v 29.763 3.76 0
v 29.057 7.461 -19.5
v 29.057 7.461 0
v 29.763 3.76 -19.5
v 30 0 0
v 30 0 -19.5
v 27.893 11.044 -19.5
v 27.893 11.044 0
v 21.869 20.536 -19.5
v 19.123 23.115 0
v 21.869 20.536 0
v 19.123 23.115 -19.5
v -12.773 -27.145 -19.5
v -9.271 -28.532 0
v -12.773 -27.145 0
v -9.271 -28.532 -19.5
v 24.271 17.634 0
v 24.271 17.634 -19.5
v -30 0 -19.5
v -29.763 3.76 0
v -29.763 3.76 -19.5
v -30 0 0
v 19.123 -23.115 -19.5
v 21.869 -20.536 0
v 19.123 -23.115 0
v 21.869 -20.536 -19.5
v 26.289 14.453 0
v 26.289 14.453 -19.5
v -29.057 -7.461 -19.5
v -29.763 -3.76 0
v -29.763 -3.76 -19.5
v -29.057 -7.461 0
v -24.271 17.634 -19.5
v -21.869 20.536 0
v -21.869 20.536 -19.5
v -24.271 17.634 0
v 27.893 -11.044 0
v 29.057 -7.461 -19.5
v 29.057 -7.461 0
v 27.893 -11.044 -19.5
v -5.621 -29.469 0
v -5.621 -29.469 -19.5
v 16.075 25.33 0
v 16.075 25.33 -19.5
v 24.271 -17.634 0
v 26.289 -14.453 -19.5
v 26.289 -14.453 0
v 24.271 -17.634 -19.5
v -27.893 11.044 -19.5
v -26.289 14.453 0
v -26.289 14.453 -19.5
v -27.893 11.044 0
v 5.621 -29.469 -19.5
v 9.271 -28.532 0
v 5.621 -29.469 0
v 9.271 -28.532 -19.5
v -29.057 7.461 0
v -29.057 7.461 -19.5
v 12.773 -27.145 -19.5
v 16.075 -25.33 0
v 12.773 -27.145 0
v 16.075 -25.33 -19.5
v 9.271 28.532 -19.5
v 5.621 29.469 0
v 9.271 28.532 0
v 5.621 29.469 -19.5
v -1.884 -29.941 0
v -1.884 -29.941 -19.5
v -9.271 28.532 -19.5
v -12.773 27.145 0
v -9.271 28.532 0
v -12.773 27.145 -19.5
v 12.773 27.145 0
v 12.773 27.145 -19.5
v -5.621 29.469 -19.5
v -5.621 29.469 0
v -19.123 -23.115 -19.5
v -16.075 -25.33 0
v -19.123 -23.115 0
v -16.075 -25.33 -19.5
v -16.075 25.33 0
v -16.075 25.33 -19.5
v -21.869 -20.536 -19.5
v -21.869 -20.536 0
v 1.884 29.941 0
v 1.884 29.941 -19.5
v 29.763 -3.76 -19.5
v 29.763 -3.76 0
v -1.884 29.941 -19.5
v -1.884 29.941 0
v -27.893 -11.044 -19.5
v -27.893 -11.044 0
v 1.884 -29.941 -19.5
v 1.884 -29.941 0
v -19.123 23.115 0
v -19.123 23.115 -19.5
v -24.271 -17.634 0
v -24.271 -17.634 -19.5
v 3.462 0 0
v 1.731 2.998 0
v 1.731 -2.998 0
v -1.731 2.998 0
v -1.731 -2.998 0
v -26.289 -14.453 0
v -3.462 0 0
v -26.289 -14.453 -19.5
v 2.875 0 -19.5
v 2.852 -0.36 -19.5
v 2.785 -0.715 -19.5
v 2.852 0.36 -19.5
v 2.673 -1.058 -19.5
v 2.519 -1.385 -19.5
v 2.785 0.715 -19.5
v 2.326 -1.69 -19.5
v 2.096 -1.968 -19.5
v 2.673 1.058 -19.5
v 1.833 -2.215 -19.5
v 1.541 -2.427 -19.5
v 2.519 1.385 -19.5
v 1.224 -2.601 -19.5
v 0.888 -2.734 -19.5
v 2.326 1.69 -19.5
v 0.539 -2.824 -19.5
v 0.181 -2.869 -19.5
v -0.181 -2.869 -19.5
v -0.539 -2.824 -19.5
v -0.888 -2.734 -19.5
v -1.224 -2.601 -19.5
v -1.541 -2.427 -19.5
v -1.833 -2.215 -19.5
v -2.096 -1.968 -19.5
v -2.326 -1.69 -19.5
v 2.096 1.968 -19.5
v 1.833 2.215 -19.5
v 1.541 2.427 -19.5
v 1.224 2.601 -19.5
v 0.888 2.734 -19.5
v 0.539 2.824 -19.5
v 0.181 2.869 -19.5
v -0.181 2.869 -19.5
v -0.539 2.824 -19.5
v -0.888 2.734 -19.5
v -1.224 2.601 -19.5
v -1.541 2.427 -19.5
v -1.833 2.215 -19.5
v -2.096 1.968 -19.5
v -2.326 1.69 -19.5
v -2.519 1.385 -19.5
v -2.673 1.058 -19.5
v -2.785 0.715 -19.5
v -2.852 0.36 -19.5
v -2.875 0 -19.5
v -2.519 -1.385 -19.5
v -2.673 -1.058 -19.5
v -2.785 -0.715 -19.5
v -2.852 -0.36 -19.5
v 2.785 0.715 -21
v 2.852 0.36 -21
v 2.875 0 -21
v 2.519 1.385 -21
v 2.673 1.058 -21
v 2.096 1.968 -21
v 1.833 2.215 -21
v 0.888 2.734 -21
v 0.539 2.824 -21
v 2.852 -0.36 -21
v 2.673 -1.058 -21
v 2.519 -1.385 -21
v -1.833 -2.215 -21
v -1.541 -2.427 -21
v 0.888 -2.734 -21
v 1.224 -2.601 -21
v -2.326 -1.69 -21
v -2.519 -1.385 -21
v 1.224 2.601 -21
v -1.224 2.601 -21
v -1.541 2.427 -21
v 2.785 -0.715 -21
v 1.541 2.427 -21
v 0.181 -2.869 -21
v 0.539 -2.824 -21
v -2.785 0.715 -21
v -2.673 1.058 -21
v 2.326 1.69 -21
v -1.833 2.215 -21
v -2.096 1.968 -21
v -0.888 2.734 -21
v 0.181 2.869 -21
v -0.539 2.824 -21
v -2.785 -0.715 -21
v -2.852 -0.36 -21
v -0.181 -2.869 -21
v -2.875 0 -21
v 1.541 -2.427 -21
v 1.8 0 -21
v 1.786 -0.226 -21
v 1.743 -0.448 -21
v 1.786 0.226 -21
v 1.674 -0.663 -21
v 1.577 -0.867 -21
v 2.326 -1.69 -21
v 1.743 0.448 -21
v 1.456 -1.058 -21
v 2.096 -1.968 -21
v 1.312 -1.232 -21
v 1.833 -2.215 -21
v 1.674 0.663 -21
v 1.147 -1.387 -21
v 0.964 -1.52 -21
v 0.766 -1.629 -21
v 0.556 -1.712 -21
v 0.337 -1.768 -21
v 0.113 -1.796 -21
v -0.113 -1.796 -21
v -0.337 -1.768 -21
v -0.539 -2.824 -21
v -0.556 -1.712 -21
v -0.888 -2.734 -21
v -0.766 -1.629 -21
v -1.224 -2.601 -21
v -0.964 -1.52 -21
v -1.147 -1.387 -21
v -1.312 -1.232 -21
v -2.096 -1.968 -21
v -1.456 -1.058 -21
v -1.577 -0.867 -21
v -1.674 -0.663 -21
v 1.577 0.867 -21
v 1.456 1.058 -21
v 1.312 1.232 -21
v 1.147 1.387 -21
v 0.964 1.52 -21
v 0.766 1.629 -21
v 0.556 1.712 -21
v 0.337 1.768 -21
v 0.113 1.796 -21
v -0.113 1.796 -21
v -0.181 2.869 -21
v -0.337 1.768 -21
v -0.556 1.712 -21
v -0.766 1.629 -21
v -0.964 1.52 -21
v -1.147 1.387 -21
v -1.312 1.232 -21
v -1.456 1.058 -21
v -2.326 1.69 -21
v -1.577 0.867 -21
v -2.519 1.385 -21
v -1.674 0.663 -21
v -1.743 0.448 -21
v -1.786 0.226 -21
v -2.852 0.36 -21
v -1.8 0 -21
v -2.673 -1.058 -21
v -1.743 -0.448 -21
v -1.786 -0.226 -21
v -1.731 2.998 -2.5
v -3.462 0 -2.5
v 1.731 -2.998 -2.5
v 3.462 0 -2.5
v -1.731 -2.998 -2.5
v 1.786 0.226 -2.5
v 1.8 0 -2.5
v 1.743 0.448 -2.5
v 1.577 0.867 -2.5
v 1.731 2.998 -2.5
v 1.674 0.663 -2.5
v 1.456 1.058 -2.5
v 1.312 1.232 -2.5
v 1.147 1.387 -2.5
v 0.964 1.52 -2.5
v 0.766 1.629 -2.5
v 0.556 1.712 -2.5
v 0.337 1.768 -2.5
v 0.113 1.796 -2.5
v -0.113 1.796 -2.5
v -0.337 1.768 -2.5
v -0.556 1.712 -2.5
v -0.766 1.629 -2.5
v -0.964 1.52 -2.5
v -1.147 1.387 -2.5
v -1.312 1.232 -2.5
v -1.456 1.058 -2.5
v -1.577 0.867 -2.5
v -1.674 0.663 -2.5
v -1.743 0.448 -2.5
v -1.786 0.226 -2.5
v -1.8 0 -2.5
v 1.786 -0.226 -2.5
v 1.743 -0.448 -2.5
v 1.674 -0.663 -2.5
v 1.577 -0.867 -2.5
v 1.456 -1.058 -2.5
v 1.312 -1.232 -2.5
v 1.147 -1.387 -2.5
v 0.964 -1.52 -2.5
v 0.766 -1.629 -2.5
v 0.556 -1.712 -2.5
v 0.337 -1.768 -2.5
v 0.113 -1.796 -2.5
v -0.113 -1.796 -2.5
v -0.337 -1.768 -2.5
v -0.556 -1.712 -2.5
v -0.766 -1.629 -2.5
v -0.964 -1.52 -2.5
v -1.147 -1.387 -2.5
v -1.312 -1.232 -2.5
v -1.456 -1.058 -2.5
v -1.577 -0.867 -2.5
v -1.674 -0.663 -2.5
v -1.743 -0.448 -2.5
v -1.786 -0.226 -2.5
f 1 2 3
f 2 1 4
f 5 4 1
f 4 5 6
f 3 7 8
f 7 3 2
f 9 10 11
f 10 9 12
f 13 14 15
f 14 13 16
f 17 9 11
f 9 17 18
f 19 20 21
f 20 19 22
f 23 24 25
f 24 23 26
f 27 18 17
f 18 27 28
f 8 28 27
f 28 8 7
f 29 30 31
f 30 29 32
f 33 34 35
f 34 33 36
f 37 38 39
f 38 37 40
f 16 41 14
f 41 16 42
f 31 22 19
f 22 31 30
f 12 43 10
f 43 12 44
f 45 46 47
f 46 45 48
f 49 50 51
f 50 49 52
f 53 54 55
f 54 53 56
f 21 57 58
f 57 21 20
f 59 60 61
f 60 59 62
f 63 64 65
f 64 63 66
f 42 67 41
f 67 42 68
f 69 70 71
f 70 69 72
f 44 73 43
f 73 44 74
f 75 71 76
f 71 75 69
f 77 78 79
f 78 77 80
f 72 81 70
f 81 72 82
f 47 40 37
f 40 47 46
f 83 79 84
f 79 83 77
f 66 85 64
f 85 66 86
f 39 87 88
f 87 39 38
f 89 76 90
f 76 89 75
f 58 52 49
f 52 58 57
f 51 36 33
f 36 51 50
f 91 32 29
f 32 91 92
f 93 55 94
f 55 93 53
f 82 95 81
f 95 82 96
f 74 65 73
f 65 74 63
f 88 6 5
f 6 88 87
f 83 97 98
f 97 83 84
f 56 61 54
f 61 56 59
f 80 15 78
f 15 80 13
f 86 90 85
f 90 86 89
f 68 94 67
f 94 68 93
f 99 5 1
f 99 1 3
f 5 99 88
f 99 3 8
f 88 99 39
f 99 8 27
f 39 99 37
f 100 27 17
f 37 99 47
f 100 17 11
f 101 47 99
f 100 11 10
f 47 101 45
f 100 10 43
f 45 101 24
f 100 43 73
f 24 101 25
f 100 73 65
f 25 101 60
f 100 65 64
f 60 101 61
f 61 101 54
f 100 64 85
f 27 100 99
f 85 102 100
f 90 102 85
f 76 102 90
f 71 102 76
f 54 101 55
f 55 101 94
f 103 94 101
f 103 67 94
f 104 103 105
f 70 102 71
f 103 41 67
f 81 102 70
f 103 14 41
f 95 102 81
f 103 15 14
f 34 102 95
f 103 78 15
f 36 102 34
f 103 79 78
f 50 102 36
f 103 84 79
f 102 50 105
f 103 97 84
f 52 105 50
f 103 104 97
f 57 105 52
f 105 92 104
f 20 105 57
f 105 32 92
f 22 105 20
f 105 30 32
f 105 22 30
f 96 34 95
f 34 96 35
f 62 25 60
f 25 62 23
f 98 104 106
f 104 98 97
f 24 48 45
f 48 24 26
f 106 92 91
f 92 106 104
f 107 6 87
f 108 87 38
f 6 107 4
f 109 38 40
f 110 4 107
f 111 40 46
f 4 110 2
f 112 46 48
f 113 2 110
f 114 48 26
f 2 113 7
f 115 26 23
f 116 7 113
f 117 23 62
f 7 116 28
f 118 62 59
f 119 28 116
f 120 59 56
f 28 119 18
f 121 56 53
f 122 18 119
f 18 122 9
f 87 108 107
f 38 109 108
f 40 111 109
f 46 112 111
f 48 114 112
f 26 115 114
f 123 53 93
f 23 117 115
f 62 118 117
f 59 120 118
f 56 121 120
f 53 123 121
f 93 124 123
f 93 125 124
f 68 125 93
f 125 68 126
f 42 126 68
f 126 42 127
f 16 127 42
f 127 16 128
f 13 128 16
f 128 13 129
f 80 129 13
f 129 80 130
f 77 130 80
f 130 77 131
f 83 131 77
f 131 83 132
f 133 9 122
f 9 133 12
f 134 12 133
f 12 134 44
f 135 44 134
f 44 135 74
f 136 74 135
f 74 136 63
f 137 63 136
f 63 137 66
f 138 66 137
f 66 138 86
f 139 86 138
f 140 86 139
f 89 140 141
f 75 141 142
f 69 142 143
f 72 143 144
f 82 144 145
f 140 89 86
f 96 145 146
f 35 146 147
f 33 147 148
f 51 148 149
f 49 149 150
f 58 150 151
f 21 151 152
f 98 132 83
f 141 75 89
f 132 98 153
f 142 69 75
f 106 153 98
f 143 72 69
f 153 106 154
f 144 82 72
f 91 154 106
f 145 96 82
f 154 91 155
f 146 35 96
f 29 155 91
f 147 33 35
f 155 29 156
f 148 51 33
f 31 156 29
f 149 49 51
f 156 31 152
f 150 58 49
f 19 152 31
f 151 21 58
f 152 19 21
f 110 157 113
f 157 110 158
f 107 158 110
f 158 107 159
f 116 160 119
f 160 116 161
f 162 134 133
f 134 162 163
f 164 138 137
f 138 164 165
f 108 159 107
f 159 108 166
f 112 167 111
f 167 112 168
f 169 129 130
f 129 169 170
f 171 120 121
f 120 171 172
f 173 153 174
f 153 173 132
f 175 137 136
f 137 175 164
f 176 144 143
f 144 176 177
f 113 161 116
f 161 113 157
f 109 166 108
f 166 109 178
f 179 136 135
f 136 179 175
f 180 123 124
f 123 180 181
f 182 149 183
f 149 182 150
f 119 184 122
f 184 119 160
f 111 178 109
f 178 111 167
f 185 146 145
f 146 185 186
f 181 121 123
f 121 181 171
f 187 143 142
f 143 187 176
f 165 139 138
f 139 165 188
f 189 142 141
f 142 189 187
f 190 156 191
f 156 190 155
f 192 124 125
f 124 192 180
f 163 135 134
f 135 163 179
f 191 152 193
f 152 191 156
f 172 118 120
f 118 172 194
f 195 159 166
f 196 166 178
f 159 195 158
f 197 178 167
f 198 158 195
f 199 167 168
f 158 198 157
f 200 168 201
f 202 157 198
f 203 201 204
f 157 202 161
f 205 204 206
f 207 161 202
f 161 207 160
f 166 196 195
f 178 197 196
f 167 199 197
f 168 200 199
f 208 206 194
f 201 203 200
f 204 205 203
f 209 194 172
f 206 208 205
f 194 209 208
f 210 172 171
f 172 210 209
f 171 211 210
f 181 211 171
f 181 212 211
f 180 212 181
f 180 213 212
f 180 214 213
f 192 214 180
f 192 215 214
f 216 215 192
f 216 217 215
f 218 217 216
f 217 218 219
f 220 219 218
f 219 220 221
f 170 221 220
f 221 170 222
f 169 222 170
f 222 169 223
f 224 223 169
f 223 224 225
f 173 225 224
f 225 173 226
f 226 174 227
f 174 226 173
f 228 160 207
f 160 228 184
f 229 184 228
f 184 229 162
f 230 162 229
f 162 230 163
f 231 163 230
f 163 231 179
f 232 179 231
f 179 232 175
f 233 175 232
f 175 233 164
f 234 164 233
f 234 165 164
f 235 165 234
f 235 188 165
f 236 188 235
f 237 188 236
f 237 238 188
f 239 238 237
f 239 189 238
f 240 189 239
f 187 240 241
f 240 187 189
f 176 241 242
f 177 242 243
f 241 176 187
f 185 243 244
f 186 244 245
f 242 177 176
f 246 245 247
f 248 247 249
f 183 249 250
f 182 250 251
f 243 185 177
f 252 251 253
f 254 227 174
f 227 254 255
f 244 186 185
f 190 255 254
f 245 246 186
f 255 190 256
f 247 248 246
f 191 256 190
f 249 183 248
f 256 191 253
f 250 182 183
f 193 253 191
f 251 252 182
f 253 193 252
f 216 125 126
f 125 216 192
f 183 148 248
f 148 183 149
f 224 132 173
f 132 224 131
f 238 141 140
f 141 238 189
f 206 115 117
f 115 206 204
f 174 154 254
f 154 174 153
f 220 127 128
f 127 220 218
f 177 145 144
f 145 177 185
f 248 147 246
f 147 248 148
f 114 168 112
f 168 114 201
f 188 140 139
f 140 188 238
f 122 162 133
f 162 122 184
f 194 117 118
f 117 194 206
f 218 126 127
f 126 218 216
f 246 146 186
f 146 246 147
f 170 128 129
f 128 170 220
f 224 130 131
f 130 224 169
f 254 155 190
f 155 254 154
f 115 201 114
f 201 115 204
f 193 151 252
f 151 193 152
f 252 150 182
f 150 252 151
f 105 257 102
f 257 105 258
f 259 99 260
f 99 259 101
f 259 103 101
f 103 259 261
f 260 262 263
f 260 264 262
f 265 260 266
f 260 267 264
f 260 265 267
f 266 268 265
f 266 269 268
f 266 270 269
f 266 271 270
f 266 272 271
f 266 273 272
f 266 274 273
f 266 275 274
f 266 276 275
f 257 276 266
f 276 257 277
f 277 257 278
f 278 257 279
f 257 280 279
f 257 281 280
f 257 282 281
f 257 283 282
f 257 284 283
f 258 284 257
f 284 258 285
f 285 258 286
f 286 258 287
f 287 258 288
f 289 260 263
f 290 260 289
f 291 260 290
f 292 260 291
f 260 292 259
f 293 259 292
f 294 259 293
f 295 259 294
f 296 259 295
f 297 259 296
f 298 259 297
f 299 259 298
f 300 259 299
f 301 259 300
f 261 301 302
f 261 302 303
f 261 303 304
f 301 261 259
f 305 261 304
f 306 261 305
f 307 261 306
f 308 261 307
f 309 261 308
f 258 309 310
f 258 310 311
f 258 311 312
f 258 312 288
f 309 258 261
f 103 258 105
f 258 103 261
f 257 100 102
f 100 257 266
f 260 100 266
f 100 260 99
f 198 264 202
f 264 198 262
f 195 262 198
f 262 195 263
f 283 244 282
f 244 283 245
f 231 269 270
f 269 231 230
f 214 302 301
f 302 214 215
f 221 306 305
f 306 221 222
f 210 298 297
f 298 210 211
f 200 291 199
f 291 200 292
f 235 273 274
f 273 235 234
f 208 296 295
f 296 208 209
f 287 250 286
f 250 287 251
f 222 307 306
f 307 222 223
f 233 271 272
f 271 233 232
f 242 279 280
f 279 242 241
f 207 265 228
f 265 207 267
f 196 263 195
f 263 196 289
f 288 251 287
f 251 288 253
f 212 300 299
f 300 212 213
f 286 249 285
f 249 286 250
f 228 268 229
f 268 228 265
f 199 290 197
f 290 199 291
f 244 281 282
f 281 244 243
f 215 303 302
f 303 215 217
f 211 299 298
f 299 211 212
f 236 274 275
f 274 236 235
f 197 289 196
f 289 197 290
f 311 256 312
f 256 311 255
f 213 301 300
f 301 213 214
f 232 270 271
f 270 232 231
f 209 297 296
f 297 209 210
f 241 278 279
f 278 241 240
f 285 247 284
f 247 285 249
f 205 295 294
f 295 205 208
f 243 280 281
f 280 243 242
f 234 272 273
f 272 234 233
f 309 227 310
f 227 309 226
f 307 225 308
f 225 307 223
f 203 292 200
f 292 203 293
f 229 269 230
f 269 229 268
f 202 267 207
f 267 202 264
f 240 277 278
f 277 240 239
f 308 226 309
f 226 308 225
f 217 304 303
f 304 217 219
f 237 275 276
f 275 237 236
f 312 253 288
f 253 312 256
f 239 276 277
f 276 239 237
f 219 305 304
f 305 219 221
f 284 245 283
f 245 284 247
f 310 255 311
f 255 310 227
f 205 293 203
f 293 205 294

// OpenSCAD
$fn = 50;


difference() {
	union() {
		translate(v = [0, 0, -19.5000000000]) {
			cylinder(h = 19.5000000000, r = 30.0000000000);
		}
		#translate(v = [0, 0, -21.0000000000]) {
			cylinder(h = 21, r = 2.8750000000);
		}
	}
	union() {
		translate(v = [0, 0, 0]) {
			rotate(a = [0, 0, 0]) {
				difference() {
					union() {
						translate(v = [0, 0, -2.5000000000]) {
							linear_extrude(height = 2.5000000000) {
								polygon(points = [[3.4620000000, 0.0000000000], [1.7310000000, 2.9981799479], [-1.7310000000, 2.9981799479], [-3.4620000000, 0.0000000000], [-1.7310000000, -2.9981799479], [1.7310000000, -2.9981799479]]);
							}
						}
					}
					union();
				}
			}
		}
		#translate(v = [0, 0, -100.0000000000]) {
			cylinder(h = 200, r = 1.8000000000);
		}
	}
}
